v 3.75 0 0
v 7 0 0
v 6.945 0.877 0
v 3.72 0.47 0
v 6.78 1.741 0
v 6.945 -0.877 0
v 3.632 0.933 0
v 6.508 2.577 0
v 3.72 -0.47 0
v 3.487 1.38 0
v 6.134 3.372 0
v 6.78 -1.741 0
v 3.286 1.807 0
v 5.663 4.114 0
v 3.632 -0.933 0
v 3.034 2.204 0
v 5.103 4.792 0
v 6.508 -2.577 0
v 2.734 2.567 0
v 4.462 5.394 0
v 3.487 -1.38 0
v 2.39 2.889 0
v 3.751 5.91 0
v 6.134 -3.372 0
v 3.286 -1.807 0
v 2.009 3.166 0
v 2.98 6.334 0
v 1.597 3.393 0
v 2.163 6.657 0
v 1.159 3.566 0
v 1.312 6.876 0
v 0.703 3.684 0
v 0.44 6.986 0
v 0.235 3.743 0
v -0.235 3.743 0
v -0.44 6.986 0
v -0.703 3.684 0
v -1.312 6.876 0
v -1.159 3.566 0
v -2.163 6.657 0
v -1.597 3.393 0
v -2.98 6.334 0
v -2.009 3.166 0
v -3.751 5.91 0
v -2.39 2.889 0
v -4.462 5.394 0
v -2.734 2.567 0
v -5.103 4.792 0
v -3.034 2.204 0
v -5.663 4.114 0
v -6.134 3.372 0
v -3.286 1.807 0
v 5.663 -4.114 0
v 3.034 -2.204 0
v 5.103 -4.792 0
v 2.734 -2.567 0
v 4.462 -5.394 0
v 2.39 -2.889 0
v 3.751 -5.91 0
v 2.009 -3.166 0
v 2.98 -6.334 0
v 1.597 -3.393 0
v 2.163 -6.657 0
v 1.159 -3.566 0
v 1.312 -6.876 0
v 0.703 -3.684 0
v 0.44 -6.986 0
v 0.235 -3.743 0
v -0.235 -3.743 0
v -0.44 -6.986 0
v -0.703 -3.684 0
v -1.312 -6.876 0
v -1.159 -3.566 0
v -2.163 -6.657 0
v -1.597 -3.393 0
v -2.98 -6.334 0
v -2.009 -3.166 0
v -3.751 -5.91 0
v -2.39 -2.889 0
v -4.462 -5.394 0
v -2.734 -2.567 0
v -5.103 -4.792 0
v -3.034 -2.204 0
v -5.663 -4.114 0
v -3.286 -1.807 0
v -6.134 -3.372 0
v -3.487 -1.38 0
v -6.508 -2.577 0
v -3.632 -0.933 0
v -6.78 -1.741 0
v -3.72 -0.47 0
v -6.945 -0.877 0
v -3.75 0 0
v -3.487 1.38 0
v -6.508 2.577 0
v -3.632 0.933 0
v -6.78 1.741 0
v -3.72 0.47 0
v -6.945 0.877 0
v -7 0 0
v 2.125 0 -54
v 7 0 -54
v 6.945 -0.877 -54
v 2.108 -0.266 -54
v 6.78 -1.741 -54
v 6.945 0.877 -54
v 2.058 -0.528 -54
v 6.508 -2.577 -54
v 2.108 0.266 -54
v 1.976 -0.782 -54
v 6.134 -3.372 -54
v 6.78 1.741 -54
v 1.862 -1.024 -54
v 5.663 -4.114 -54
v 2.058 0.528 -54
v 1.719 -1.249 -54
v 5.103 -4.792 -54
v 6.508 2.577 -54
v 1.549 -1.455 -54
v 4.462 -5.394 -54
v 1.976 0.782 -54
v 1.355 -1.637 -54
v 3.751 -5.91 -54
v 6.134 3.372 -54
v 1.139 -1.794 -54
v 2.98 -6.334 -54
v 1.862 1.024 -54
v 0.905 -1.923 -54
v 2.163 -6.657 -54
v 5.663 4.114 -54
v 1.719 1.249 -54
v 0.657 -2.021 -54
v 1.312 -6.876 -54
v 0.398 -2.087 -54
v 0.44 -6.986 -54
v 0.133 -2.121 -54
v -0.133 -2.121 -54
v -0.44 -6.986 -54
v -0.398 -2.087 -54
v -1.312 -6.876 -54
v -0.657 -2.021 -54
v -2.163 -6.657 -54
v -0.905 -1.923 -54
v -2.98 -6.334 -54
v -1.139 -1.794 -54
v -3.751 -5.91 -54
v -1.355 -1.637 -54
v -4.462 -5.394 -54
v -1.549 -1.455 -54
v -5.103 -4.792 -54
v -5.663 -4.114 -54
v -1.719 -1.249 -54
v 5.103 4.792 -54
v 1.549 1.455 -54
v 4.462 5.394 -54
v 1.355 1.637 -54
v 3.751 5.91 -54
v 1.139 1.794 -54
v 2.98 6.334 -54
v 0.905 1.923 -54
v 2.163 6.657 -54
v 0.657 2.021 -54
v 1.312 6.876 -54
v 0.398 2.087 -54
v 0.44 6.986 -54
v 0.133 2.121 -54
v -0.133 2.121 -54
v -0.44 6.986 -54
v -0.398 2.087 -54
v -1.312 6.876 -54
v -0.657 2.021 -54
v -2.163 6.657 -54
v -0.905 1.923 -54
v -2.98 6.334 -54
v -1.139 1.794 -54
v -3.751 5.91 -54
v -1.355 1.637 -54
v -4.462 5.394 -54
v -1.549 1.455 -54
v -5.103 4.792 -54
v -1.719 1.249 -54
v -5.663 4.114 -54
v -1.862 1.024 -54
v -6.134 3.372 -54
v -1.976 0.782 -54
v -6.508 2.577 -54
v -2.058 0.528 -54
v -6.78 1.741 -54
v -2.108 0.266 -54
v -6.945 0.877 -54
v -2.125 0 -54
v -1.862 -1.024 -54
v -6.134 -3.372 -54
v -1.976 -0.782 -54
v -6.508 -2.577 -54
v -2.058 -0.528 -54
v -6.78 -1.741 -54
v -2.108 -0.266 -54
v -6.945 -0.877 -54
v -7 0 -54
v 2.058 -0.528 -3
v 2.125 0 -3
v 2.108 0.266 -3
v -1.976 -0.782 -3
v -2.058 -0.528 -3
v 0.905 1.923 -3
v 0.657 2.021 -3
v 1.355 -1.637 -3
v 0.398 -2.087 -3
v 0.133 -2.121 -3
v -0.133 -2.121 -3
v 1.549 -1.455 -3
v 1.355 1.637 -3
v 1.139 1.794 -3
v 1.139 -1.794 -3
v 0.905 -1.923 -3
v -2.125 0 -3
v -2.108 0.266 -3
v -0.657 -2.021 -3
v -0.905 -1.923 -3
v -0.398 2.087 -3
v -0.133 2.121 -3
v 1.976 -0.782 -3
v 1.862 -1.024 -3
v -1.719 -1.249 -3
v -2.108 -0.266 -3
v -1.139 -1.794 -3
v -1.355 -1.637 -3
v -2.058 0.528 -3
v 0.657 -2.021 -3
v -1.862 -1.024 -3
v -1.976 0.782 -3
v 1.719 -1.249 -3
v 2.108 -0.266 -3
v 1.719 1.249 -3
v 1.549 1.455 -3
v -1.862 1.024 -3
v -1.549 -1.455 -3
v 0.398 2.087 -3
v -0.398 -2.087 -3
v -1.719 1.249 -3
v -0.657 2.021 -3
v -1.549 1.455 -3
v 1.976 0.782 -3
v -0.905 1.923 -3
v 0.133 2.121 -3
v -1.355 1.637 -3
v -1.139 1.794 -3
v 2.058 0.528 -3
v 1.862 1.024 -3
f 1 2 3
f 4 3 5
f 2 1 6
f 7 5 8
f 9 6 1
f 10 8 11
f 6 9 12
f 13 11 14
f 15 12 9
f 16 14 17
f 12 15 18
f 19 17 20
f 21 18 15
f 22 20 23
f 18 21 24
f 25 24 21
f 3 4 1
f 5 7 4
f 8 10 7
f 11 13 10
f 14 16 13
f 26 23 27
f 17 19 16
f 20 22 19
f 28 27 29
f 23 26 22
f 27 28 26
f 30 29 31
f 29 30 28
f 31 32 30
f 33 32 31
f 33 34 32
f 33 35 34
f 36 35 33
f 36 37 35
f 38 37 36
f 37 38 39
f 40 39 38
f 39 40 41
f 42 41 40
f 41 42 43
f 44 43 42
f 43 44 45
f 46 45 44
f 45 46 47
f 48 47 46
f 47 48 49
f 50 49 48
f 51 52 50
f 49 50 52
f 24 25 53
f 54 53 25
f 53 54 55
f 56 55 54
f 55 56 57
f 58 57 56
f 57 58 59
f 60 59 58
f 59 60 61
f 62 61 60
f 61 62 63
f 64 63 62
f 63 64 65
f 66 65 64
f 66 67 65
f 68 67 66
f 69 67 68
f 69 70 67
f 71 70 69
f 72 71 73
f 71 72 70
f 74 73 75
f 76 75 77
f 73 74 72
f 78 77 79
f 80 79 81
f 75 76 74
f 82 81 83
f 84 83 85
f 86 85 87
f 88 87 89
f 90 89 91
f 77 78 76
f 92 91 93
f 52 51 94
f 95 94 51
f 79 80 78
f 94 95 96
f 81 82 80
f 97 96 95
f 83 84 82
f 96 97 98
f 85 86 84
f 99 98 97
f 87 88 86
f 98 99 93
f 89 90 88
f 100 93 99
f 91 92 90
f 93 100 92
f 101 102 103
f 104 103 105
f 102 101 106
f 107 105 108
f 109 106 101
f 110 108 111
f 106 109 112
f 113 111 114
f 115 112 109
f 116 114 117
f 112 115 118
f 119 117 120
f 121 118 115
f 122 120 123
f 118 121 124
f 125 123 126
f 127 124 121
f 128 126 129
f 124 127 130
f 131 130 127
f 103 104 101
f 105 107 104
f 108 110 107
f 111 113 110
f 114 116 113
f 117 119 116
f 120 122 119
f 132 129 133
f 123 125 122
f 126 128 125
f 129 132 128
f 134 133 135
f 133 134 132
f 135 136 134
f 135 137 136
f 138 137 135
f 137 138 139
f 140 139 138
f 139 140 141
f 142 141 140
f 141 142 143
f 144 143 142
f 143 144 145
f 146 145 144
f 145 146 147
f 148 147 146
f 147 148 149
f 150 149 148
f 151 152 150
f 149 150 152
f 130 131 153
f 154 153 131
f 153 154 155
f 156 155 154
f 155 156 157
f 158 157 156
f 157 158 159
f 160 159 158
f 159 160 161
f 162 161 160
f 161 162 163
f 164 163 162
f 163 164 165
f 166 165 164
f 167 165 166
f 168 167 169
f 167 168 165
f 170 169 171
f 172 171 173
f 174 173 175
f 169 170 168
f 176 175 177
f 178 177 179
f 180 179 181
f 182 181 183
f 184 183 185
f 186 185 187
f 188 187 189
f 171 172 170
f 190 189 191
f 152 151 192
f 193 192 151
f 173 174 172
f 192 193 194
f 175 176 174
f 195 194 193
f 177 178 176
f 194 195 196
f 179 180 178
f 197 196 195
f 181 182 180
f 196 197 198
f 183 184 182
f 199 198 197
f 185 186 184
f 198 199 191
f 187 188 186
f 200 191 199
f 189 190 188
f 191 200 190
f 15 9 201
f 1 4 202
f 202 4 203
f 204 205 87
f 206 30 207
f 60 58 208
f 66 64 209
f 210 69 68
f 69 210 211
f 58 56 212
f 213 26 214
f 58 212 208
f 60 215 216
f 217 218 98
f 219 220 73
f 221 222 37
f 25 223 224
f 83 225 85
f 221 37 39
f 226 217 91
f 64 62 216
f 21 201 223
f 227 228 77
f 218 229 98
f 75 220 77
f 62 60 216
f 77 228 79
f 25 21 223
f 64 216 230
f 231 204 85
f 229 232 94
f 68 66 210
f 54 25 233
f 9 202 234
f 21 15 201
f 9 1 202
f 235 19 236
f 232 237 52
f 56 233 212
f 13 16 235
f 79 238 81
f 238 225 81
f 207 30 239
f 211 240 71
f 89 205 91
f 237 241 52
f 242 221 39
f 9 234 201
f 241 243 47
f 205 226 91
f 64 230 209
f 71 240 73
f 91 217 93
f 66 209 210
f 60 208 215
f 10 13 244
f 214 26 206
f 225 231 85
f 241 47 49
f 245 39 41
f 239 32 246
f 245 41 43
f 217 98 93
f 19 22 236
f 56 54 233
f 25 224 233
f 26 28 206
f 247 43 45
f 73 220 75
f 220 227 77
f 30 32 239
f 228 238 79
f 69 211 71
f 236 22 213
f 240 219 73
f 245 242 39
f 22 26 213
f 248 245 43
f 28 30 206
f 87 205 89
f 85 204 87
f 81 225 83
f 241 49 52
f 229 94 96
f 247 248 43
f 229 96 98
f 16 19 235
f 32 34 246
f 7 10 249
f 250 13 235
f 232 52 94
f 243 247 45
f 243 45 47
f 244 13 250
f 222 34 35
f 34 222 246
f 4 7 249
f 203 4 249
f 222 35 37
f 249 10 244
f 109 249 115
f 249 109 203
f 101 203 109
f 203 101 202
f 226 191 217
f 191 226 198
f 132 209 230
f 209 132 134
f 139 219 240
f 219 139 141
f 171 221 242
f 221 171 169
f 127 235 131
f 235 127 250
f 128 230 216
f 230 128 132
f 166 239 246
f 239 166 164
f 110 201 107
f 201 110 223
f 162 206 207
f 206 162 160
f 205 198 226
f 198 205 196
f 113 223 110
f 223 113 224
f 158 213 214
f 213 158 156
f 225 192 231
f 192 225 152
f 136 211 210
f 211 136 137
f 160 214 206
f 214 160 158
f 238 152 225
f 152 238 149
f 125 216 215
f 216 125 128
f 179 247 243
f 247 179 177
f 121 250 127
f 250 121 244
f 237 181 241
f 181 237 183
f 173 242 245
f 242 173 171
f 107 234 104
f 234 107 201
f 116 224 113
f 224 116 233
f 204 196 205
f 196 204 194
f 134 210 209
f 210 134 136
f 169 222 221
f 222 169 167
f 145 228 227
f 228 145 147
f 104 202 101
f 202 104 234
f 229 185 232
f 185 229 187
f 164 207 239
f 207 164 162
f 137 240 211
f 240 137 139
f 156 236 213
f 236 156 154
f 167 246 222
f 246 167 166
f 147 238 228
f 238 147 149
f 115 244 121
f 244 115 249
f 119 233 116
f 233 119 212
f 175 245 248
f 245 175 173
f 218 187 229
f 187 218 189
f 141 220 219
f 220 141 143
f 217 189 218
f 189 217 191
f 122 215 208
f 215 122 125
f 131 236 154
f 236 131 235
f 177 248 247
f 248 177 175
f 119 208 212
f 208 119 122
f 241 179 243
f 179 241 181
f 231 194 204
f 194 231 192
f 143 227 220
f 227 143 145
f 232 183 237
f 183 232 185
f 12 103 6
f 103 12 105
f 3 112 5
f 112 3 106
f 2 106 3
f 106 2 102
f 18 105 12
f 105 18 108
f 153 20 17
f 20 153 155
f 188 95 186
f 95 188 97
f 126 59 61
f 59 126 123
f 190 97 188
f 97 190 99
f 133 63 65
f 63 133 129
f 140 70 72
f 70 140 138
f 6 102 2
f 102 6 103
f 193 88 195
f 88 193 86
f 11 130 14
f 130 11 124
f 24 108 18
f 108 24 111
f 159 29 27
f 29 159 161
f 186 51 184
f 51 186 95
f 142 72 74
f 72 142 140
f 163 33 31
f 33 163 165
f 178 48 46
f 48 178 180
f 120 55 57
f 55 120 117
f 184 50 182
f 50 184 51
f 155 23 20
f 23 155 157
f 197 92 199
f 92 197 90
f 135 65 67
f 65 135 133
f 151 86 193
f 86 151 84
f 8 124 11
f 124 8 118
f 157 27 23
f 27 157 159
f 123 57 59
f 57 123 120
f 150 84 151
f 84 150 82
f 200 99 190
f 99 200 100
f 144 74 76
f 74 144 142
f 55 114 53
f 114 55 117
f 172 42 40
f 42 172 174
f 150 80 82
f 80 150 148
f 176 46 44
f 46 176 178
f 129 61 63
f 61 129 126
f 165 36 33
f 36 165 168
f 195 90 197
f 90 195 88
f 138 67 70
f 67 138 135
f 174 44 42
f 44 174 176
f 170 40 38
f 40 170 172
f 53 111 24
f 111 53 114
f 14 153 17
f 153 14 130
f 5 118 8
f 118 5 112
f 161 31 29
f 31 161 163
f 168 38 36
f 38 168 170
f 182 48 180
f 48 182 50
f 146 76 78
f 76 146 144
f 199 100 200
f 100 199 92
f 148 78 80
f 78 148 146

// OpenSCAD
$fn = 50;


difference() {
	union() {
		translate(v = [0, 0, -54.0000000000]) {
			cylinder(h = 54, r = 7.0000000000);
		}
		cylinder(h = 0, r = 10.0000000000);
	}
	union() {
		translate(v = [0, 0, 0]) {
			rotate(a = [0, 0, 0]) {
				difference() {
					union() {
						#translate(v = [0, 0, -54.0000000000]) {
							cylinder(h = 54, r = 2.0000000000);
						}
						#translate(v = [0, 0, -3]) {
							cylinder(h = 3, r = 7.0000000000, r1 = 2.1250000000, r2 = 3.7500000000);
						}
						#translate(v = [0, 0, -54.0000000000]) {
							cylinder(h = 54, r = 2.1250000000);
						}
						#translate(v = [0, 0, -54.0000000000]) {
							cylinder(h = 54, r = 2.0000000000);
						}
					}
					union();
				}
			}
		}
	}
}
